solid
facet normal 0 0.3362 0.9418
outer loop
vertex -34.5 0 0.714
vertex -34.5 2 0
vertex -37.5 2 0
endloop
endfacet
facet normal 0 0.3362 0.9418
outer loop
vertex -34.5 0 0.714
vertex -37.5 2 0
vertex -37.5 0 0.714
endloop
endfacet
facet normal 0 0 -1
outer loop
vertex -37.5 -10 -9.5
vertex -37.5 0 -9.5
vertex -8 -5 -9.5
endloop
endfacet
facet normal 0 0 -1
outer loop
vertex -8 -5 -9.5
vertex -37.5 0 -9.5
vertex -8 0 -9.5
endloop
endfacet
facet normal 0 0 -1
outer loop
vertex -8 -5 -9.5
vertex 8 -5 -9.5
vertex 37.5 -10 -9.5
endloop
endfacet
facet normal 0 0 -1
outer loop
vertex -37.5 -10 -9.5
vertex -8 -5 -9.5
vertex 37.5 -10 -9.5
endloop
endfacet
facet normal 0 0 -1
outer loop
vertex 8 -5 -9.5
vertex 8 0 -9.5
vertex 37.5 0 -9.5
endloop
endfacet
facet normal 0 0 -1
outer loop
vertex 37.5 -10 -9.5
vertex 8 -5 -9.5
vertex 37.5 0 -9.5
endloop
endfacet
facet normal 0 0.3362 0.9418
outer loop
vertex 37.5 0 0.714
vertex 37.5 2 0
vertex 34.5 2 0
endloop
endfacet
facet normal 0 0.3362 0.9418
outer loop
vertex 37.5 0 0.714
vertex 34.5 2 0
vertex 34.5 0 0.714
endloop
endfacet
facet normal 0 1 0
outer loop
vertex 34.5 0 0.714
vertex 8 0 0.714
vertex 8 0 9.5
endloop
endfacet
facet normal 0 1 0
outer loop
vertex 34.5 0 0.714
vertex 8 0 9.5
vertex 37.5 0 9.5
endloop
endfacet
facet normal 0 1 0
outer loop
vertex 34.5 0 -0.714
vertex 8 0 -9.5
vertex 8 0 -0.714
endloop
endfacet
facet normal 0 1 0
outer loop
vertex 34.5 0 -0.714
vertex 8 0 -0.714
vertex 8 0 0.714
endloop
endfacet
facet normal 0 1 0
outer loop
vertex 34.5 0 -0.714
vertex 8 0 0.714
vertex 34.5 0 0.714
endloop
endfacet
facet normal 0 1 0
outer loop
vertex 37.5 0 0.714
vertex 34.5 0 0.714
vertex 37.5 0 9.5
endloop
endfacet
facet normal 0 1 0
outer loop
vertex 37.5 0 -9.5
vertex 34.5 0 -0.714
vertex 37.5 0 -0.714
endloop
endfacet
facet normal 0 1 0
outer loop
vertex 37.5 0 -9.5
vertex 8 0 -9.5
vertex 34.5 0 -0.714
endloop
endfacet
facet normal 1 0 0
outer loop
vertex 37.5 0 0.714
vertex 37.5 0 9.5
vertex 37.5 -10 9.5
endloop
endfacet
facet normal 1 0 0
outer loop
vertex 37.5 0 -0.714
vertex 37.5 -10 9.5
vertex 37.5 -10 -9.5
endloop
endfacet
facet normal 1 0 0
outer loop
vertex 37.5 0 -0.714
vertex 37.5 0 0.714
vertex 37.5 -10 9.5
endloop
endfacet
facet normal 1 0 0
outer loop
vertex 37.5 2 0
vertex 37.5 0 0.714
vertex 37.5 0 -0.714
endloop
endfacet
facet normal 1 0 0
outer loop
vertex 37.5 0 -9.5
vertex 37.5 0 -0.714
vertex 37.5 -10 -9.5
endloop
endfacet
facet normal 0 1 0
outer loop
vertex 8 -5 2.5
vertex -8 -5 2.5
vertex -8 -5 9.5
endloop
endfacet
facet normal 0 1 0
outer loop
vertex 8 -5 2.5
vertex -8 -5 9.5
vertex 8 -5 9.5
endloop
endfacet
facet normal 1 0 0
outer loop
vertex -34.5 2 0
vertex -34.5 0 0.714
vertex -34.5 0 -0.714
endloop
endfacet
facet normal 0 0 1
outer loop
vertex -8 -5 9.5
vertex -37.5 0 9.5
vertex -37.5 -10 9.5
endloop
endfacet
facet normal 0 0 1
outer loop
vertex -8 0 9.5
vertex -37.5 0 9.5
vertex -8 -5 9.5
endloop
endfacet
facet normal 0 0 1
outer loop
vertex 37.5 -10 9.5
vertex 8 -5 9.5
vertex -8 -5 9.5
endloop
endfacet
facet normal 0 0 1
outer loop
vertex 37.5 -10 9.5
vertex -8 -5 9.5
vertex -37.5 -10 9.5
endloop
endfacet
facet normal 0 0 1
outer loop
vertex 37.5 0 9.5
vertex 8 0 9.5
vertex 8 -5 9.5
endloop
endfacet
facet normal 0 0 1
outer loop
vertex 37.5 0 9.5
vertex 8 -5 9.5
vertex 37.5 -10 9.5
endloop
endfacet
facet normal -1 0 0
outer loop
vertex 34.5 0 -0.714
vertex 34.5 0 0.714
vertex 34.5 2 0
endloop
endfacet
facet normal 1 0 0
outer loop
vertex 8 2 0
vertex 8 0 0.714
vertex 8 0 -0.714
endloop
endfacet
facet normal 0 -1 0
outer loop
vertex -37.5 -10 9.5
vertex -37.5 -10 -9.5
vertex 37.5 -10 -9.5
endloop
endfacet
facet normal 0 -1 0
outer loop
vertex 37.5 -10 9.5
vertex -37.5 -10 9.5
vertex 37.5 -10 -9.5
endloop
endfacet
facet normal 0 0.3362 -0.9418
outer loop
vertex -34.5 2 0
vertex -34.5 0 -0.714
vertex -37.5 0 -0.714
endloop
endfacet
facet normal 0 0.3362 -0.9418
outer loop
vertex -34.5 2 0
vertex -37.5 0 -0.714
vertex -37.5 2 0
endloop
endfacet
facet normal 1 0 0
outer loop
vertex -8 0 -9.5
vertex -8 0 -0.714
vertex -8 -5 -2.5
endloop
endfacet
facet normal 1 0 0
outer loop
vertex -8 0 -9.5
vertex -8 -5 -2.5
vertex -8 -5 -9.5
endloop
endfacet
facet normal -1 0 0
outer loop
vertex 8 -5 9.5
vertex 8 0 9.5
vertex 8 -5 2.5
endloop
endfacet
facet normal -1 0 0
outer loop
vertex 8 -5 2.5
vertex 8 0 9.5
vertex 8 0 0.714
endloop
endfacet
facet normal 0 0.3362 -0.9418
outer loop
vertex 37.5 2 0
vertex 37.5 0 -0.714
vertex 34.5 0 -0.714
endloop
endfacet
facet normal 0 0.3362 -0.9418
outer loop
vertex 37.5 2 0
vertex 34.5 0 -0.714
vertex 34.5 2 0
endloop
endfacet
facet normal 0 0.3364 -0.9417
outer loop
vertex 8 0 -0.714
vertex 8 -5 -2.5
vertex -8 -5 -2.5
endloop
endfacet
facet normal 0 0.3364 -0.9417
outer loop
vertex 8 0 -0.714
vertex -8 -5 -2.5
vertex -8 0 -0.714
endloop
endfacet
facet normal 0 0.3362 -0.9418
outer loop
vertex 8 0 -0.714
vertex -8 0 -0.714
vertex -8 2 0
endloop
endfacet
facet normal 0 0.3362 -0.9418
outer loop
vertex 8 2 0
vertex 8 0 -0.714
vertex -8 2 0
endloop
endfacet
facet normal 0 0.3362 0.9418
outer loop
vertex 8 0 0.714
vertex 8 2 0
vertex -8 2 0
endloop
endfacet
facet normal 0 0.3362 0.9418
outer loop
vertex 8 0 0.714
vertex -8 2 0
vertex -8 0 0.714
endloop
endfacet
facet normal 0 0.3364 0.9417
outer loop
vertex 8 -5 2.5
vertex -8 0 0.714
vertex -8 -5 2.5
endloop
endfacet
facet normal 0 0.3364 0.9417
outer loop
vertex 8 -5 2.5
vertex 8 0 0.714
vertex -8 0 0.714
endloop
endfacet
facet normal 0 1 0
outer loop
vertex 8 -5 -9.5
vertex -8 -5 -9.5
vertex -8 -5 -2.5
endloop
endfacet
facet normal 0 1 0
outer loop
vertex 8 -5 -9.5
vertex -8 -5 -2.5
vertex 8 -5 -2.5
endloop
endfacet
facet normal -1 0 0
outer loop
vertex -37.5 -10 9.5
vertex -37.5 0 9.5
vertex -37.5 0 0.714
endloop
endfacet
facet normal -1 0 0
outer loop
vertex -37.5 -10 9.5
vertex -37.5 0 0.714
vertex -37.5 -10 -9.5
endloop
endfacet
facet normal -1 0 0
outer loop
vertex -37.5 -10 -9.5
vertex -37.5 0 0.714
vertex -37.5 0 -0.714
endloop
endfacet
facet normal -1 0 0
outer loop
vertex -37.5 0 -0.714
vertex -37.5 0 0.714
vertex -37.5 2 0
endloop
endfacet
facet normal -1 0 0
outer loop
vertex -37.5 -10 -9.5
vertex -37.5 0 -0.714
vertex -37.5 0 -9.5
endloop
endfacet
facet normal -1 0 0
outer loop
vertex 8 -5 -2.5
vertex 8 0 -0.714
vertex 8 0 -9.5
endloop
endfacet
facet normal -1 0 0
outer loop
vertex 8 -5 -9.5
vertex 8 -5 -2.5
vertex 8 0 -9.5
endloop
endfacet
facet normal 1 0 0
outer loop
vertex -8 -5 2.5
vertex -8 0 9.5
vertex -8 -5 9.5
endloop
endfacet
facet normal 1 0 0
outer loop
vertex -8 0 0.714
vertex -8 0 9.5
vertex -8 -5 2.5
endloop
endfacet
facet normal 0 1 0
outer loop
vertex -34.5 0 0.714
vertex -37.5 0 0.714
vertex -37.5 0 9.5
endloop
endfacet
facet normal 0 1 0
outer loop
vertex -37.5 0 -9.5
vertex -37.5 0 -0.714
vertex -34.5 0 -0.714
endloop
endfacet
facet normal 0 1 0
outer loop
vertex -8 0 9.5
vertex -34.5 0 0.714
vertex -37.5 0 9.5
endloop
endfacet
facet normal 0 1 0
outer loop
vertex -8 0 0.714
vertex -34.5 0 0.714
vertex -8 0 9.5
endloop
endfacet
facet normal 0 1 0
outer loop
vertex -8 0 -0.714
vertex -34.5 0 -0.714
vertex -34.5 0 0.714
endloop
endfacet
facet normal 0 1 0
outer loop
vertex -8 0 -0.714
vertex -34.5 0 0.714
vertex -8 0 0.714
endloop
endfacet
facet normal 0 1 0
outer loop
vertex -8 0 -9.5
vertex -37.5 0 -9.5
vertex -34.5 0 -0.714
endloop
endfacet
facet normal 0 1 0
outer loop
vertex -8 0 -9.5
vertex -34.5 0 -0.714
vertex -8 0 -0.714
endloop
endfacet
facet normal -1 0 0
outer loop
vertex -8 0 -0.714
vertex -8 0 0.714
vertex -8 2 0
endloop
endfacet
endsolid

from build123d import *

# Parameters (mm, degrees)
SKETCH1_W                = 75
SKETCH1_H                = 19
BOSS_EXTRUDE1_DEPTH      = 10
SKETCH4_W                = 16
SKETCH4_H                = 19
CUT_EXTRUDE1_DEPTH       = 5
BOSS_EXTRUDE2_DEPTH      = 45.5
BOSS_EXTRUDE2_DEPTH_BACK = 29.5
SKETCH6_W                = 26.5
SKETCH6_H                = 19
CUT_EXTRUDE2_DEPTH       = 2


with BuildPart() as part:
    # Sketch1 → Boss-Extrude1 (new body)
    with BuildSketch(Plane(origin=(0, 0, 0), x_dir=(1, 0, 0), z_dir=(0, 1, 0))):
        Rectangle(SKETCH1_W, SKETCH1_H)
    extrude(amount=-BOSS_EXTRUDE1_DEPTH)

    # Sketch4 → Cut-Extrude1 (cut)
    with BuildSketch(Plane(origin=(0, 0, 0), x_dir=(1, 0, 0), z_dir=(0, 1, 0))):
        Rectangle(SKETCH4_W, SKETCH4_H)
    extrude(amount=-CUT_EXTRUDE1_DEPTH, mode=Mode.SUBTRACT)

    # Sketch5 → Boss-Extrude2 (add, two sides: drawn at the far end of the back side and taken through both)
    with BuildSketch(Plane.ZY.offset(-8).offset(-BOSS_EXTRUDE2_DEPTH_BACK)):
        Polygon((-2.5, -5), (0, 2), (2.5, -5), align=None)
    extrude(amount=BOSS_EXTRUDE2_DEPTH + BOSS_EXTRUDE2_DEPTH_BACK)

    # Sketch6 → Cut-Extrude2 (cut)
    with BuildSketch(Plane(origin=(0, 0, 0), x_dir=(1, 0, 0), z_dir=(0, 1, 0))):
        with Locations((-21.25, 0)):
            Rectangle(SKETCH6_W, SKETCH6_H)
        with Locations((21.25, 0)):
            Rectangle(SKETCH6_W, SKETCH6_H)
    extrude(amount=CUT_EXTRUDE2_DEPTH, mode=Mode.SUBTRACT)


solid = part.part
